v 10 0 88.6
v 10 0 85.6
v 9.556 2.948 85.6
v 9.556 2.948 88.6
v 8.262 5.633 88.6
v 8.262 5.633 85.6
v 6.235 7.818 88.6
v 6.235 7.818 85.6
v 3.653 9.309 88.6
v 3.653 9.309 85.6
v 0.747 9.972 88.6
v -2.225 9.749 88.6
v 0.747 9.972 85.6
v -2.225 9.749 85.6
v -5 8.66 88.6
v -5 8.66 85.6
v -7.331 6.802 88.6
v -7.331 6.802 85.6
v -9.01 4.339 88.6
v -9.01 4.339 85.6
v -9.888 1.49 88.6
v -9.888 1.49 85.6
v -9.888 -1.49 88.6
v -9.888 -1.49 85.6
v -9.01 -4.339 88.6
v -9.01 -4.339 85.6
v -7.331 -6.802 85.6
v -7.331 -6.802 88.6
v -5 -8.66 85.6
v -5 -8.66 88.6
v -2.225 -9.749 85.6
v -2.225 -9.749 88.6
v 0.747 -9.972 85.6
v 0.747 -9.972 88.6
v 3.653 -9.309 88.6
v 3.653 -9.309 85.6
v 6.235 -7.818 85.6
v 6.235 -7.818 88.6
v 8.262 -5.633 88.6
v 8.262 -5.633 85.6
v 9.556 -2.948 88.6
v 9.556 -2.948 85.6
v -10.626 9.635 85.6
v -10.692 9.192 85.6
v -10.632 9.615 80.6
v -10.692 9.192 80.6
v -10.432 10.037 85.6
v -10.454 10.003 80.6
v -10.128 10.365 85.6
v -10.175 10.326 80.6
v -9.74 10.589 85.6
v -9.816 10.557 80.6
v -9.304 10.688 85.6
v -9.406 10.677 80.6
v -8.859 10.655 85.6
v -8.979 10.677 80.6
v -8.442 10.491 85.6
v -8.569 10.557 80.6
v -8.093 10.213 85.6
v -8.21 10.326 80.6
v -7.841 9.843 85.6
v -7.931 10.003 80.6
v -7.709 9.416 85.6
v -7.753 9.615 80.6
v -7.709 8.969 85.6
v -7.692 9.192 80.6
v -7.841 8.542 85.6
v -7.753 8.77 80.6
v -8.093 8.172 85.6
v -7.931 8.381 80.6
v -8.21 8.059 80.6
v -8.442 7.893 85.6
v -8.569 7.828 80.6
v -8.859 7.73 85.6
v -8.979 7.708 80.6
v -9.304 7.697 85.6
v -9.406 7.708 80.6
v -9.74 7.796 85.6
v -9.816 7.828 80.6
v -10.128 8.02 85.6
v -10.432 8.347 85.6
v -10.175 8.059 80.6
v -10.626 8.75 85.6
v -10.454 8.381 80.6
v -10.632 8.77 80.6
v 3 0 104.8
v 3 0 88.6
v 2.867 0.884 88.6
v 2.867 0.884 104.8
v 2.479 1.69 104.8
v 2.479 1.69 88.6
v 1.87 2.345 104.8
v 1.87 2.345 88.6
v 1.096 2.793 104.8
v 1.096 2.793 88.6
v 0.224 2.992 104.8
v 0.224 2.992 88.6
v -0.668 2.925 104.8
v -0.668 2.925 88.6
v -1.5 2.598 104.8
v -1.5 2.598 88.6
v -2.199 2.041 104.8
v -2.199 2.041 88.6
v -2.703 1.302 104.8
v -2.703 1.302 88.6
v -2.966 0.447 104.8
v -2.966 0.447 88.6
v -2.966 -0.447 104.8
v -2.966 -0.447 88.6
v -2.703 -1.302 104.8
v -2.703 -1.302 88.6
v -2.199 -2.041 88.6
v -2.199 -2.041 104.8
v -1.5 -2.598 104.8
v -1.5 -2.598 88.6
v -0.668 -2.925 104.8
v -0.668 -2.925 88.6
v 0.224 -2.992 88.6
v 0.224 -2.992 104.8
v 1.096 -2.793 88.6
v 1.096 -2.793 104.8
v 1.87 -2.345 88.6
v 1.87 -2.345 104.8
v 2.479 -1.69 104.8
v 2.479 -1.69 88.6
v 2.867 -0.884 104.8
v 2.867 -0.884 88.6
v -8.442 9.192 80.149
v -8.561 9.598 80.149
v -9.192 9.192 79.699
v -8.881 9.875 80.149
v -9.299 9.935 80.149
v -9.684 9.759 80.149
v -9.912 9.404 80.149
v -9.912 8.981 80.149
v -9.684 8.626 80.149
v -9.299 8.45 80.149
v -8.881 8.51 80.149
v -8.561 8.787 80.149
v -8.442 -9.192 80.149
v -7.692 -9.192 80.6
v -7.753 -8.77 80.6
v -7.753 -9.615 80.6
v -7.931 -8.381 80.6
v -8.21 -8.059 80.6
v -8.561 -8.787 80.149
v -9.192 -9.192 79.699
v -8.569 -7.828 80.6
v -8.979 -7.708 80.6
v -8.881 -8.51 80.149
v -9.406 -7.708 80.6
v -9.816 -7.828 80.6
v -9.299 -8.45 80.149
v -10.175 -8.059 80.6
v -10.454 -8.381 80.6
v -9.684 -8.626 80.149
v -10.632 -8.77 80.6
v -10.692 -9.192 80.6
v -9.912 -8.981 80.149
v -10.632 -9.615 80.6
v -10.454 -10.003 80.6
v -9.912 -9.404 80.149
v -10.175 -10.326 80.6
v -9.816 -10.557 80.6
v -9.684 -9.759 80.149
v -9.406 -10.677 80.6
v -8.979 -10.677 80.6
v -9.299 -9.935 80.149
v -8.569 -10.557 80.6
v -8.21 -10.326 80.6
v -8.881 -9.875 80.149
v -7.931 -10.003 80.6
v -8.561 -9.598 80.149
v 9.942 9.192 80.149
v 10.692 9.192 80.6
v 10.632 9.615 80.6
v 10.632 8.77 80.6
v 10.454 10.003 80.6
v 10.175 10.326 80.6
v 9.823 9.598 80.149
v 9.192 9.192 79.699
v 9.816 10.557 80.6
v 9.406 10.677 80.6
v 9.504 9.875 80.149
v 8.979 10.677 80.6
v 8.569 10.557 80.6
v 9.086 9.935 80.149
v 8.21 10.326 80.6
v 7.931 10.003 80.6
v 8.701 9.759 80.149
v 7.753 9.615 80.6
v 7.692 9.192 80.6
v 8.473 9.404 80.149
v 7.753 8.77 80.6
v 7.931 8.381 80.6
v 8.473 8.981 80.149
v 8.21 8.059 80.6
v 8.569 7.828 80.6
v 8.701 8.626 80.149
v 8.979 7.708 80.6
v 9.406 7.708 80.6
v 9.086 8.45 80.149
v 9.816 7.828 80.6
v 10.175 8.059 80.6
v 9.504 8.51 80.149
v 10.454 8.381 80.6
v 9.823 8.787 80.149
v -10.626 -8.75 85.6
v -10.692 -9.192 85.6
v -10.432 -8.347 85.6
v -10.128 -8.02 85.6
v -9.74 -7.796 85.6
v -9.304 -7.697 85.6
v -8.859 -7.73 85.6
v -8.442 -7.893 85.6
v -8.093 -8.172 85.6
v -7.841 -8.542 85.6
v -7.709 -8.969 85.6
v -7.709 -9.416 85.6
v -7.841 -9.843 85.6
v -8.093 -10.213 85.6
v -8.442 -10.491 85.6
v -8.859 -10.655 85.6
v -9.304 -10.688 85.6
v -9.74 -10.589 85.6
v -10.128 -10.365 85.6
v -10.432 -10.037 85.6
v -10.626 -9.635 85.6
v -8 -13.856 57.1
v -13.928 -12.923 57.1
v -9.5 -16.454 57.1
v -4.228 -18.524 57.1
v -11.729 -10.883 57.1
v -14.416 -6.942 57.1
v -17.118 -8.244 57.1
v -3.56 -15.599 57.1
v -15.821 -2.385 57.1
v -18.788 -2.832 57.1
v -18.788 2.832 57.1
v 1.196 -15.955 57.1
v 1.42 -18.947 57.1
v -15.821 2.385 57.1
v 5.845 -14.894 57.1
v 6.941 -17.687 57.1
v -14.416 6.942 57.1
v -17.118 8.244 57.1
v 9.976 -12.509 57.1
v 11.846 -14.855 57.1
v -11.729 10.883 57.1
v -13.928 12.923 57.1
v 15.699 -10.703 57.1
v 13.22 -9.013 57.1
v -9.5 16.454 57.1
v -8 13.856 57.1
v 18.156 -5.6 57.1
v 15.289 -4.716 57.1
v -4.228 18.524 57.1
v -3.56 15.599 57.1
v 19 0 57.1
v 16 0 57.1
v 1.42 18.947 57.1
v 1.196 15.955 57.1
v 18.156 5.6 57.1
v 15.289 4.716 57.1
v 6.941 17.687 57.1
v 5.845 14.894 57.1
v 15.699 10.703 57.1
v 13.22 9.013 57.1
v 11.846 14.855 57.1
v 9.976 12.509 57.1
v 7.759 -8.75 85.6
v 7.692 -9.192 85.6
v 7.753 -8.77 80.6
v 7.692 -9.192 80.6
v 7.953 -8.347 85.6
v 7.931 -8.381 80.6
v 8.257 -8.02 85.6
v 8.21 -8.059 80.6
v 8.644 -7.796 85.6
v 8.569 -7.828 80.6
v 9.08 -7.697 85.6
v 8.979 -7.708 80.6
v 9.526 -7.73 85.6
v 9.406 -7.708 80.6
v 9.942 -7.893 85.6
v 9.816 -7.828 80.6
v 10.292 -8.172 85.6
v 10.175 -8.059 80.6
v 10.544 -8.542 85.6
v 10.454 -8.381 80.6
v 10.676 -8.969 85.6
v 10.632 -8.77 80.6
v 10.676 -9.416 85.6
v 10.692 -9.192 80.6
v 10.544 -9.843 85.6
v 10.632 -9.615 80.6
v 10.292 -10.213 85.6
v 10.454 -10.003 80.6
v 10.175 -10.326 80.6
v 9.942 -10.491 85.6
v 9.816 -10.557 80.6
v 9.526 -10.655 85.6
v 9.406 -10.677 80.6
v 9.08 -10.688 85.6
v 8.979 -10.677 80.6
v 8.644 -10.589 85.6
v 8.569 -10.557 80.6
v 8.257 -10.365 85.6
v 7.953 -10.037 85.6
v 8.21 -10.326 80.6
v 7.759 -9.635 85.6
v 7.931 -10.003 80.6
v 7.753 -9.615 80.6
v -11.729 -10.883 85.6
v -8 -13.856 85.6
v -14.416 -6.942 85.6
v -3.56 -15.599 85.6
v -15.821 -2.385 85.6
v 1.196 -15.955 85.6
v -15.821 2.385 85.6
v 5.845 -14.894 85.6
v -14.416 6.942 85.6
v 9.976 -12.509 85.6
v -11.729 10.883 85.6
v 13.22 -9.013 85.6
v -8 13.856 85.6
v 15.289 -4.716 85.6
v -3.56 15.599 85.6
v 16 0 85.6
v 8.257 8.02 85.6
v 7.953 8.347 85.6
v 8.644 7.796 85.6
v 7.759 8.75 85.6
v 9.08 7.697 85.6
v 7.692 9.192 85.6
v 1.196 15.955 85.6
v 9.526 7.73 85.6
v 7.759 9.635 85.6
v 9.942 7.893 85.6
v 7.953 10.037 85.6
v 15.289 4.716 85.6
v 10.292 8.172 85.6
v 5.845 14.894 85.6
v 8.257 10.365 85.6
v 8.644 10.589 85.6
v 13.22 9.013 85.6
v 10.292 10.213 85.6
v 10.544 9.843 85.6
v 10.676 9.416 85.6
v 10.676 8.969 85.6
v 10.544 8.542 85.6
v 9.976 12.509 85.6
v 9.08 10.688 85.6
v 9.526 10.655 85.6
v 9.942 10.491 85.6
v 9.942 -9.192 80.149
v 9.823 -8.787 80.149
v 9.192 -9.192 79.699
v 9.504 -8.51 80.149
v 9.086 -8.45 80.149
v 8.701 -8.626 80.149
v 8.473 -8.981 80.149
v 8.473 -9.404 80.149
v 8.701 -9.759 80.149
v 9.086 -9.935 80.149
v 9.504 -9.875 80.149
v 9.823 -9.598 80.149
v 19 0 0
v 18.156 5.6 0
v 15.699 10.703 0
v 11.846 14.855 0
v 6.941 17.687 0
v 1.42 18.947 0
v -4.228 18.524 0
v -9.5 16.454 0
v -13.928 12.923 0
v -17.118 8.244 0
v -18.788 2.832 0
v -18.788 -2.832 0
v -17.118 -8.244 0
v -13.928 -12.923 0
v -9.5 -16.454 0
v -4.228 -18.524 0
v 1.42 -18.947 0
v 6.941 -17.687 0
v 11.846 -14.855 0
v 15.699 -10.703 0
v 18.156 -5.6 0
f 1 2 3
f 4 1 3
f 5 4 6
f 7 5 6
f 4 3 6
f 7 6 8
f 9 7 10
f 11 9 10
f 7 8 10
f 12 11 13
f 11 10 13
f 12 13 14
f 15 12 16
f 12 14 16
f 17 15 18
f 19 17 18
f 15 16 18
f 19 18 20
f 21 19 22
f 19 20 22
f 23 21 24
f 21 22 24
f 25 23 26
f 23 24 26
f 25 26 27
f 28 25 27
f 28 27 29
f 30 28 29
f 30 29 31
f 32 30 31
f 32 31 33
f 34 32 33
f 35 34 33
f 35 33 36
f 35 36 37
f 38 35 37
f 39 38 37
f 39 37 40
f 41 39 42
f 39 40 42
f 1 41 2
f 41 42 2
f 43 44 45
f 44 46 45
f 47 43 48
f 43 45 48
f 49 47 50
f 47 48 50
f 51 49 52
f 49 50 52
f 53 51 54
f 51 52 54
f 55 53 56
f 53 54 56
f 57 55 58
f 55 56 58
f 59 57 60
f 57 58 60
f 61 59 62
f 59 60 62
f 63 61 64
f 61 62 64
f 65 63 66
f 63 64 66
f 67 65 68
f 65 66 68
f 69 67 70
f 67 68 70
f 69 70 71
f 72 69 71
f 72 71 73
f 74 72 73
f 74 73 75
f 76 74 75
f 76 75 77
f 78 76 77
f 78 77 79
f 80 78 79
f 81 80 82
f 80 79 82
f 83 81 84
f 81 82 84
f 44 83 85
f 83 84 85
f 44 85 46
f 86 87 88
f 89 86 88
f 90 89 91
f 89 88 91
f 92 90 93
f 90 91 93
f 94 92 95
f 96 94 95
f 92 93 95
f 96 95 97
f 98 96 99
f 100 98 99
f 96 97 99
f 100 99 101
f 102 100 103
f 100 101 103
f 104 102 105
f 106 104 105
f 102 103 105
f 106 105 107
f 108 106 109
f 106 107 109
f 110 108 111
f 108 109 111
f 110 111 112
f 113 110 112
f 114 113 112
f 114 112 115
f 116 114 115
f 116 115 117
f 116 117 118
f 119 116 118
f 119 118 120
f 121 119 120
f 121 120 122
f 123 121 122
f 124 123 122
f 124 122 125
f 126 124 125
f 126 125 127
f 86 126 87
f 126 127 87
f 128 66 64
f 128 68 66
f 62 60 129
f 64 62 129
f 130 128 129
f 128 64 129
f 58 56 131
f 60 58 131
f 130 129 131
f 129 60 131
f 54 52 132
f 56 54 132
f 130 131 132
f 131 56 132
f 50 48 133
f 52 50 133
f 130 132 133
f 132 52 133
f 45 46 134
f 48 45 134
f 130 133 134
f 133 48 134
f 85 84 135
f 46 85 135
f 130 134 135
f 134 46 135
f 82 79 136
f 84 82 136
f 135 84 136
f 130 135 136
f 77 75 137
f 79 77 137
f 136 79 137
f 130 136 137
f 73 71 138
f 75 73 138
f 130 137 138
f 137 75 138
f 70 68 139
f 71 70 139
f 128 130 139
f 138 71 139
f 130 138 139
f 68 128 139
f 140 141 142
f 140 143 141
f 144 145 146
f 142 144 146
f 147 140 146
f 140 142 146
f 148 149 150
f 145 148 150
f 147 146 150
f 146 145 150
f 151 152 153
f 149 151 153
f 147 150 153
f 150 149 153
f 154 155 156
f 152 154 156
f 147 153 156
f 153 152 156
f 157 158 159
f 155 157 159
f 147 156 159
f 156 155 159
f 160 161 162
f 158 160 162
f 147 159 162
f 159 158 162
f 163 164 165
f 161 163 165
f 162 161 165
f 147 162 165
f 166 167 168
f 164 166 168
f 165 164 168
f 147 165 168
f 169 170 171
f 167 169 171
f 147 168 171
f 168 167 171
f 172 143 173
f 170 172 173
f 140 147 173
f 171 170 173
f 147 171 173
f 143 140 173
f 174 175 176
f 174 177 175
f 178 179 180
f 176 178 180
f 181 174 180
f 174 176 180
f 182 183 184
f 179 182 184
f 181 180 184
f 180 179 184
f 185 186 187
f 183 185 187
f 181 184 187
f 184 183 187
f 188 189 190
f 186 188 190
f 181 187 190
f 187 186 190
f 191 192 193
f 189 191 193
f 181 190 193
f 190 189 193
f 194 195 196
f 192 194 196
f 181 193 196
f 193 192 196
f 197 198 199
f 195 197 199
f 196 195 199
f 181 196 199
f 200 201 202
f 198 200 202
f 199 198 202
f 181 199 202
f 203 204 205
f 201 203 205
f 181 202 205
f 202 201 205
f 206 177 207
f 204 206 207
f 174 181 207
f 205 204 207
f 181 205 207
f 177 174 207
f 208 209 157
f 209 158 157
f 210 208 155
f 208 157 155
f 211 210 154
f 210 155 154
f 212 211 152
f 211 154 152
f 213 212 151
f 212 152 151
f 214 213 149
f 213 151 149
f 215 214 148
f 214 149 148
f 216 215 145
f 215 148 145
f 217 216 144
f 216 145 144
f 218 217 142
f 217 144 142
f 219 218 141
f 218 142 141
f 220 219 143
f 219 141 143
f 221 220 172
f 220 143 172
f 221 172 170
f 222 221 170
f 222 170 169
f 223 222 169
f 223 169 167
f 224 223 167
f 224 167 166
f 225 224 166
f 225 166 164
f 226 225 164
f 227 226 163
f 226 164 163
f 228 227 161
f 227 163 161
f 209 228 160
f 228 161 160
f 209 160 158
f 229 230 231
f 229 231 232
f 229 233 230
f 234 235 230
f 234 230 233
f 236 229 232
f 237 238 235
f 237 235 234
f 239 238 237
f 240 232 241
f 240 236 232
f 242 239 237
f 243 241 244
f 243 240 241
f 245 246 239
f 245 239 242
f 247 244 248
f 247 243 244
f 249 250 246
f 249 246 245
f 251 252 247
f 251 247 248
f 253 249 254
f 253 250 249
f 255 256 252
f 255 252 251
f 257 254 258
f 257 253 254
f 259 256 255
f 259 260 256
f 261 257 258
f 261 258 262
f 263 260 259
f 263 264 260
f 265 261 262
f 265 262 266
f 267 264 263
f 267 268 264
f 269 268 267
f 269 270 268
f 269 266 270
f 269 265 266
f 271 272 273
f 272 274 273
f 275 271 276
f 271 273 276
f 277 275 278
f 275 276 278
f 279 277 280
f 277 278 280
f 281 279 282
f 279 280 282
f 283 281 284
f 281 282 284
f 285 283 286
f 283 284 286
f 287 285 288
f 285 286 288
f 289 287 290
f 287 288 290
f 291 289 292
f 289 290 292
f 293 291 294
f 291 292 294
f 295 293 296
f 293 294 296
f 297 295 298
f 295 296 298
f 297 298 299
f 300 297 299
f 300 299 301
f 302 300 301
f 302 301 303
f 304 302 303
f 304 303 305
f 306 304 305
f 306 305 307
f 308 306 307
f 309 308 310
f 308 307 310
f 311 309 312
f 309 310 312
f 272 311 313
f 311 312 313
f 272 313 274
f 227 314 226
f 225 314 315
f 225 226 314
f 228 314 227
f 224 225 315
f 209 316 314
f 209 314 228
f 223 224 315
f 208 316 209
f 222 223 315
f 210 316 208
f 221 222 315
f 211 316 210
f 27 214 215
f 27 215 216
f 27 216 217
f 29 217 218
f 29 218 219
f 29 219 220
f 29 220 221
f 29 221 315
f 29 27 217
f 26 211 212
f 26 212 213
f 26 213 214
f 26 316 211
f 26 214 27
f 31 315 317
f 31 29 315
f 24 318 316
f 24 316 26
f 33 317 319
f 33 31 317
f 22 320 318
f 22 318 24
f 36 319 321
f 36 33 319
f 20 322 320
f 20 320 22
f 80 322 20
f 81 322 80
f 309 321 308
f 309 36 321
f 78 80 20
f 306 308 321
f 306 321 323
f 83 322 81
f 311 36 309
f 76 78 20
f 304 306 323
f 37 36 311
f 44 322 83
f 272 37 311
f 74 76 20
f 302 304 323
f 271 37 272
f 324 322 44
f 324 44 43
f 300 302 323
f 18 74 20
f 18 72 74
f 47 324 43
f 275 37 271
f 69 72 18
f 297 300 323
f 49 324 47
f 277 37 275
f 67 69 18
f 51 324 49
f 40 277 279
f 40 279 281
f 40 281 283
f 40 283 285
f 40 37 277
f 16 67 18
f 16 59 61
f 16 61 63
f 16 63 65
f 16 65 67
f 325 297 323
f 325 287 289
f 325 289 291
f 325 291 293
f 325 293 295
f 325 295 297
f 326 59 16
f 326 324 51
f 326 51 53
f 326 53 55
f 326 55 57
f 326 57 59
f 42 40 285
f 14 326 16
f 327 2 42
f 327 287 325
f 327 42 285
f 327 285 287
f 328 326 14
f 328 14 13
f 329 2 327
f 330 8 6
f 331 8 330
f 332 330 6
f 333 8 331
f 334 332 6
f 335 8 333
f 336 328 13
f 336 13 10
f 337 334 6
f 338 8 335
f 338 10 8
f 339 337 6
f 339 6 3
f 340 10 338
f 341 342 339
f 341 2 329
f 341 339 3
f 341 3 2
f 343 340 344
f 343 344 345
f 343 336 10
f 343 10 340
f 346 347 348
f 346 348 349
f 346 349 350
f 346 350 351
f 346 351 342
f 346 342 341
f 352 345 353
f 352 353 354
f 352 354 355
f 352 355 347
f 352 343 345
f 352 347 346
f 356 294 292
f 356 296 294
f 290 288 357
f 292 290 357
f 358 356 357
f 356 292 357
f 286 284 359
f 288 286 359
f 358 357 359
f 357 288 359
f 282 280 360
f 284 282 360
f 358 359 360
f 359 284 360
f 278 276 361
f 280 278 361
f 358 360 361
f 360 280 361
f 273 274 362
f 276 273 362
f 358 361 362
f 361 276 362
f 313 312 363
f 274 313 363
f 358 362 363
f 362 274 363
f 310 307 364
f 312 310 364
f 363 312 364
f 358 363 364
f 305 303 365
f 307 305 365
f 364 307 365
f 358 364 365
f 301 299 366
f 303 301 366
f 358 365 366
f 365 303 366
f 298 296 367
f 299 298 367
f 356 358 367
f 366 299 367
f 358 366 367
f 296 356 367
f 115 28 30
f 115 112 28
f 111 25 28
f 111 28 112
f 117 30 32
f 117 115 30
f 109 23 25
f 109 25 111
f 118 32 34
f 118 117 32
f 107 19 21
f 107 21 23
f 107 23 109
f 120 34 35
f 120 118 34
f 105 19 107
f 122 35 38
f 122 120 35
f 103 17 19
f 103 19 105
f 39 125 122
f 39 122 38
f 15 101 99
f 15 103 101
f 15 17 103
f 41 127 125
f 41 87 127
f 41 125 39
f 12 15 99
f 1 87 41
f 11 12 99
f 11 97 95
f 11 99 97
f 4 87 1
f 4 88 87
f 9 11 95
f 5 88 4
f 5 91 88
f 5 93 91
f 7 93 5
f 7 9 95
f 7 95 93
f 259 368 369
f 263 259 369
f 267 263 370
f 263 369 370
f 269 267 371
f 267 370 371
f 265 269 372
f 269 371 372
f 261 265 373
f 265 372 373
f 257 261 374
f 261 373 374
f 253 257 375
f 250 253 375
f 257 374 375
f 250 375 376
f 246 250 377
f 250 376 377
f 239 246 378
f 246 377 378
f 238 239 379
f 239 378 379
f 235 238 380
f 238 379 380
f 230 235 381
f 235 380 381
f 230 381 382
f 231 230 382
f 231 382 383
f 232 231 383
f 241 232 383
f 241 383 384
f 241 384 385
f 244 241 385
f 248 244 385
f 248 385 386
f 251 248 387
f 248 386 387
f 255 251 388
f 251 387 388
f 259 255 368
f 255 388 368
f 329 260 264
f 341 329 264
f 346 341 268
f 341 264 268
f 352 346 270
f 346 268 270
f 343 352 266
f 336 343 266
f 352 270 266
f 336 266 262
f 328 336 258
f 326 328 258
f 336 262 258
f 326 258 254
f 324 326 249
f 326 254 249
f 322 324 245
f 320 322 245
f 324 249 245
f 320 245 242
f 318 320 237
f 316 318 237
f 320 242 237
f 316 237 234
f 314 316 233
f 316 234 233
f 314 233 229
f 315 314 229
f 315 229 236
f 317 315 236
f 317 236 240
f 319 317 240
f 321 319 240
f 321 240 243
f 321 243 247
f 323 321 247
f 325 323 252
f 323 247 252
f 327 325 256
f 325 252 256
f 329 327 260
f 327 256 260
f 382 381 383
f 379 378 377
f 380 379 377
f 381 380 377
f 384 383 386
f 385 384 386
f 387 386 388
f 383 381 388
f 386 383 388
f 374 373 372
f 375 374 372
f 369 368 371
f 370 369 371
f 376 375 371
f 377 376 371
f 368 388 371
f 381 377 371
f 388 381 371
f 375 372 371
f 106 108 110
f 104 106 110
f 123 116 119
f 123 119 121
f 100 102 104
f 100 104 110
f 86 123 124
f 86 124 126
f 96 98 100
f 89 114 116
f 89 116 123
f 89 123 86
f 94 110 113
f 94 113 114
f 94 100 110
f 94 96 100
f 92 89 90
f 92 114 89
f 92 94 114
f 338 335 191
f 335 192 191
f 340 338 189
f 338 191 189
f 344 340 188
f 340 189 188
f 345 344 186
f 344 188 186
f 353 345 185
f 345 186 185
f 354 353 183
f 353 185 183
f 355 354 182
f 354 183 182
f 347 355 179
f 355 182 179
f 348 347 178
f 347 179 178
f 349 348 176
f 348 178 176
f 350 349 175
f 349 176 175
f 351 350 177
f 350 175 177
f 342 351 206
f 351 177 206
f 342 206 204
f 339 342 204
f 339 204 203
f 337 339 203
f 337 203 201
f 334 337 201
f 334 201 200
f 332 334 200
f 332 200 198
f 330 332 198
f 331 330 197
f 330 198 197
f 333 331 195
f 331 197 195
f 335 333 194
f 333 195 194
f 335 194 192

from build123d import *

# Parameters (mm, degrees)
F0_R     = 19
F1_DEPTH = 57.1
F2_R     = 16
F3_DEPTH = 28.5
F4_R     = 10
F5_DEPTH = 3
F6_R     = 3
F7_DEPTH = 16.2
F9_D     = 3
F9_DEPTH = 5
F9_TIP   = 0.9012909285


with BuildPart() as f1:
    # F0 (on Top) → F1 (new body)
    with BuildSketch(Plane.XY):
        Circle(F0_R)
    extrude(amount=F1_DEPTH)

    # F2 (on face) → F3 (join)
    with BuildSketch(Plane.XY.offset(57.1)):
        Circle(F2_R)
    extrude(amount=F3_DEPTH)

    # F4 (on face) → F5 (join)
    with BuildSketch(Plane.XY.offset(85.6)):
        Circle(F4_R)
    extrude(amount=F5_DEPTH)

    # F6 (on face) → F7 (join)
    with BuildSketch(Plane.XY.offset(88.6)):
        Circle(F6_R)
    extrude(amount=F7_DEPTH)

    # F9
    with Locations(Plane.XY.offset(85.6)):
        with Locations((-9.1923881554, 9.1923881554), (9.1923881554, 9.1923881554), (9.1923881554, -9.1923881554), (-9.1923881554, -9.1923881554)):
            Hole(F9_D / 2, depth=F9_DEPTH)
            with Locations((0, 0, -(F9_DEPTH + F9_TIP / 2))):  # 118° drill point
                Cone(0, F9_D / 2, F9_TIP, mode=Mode.SUBTRACT)


solid = f1.part
